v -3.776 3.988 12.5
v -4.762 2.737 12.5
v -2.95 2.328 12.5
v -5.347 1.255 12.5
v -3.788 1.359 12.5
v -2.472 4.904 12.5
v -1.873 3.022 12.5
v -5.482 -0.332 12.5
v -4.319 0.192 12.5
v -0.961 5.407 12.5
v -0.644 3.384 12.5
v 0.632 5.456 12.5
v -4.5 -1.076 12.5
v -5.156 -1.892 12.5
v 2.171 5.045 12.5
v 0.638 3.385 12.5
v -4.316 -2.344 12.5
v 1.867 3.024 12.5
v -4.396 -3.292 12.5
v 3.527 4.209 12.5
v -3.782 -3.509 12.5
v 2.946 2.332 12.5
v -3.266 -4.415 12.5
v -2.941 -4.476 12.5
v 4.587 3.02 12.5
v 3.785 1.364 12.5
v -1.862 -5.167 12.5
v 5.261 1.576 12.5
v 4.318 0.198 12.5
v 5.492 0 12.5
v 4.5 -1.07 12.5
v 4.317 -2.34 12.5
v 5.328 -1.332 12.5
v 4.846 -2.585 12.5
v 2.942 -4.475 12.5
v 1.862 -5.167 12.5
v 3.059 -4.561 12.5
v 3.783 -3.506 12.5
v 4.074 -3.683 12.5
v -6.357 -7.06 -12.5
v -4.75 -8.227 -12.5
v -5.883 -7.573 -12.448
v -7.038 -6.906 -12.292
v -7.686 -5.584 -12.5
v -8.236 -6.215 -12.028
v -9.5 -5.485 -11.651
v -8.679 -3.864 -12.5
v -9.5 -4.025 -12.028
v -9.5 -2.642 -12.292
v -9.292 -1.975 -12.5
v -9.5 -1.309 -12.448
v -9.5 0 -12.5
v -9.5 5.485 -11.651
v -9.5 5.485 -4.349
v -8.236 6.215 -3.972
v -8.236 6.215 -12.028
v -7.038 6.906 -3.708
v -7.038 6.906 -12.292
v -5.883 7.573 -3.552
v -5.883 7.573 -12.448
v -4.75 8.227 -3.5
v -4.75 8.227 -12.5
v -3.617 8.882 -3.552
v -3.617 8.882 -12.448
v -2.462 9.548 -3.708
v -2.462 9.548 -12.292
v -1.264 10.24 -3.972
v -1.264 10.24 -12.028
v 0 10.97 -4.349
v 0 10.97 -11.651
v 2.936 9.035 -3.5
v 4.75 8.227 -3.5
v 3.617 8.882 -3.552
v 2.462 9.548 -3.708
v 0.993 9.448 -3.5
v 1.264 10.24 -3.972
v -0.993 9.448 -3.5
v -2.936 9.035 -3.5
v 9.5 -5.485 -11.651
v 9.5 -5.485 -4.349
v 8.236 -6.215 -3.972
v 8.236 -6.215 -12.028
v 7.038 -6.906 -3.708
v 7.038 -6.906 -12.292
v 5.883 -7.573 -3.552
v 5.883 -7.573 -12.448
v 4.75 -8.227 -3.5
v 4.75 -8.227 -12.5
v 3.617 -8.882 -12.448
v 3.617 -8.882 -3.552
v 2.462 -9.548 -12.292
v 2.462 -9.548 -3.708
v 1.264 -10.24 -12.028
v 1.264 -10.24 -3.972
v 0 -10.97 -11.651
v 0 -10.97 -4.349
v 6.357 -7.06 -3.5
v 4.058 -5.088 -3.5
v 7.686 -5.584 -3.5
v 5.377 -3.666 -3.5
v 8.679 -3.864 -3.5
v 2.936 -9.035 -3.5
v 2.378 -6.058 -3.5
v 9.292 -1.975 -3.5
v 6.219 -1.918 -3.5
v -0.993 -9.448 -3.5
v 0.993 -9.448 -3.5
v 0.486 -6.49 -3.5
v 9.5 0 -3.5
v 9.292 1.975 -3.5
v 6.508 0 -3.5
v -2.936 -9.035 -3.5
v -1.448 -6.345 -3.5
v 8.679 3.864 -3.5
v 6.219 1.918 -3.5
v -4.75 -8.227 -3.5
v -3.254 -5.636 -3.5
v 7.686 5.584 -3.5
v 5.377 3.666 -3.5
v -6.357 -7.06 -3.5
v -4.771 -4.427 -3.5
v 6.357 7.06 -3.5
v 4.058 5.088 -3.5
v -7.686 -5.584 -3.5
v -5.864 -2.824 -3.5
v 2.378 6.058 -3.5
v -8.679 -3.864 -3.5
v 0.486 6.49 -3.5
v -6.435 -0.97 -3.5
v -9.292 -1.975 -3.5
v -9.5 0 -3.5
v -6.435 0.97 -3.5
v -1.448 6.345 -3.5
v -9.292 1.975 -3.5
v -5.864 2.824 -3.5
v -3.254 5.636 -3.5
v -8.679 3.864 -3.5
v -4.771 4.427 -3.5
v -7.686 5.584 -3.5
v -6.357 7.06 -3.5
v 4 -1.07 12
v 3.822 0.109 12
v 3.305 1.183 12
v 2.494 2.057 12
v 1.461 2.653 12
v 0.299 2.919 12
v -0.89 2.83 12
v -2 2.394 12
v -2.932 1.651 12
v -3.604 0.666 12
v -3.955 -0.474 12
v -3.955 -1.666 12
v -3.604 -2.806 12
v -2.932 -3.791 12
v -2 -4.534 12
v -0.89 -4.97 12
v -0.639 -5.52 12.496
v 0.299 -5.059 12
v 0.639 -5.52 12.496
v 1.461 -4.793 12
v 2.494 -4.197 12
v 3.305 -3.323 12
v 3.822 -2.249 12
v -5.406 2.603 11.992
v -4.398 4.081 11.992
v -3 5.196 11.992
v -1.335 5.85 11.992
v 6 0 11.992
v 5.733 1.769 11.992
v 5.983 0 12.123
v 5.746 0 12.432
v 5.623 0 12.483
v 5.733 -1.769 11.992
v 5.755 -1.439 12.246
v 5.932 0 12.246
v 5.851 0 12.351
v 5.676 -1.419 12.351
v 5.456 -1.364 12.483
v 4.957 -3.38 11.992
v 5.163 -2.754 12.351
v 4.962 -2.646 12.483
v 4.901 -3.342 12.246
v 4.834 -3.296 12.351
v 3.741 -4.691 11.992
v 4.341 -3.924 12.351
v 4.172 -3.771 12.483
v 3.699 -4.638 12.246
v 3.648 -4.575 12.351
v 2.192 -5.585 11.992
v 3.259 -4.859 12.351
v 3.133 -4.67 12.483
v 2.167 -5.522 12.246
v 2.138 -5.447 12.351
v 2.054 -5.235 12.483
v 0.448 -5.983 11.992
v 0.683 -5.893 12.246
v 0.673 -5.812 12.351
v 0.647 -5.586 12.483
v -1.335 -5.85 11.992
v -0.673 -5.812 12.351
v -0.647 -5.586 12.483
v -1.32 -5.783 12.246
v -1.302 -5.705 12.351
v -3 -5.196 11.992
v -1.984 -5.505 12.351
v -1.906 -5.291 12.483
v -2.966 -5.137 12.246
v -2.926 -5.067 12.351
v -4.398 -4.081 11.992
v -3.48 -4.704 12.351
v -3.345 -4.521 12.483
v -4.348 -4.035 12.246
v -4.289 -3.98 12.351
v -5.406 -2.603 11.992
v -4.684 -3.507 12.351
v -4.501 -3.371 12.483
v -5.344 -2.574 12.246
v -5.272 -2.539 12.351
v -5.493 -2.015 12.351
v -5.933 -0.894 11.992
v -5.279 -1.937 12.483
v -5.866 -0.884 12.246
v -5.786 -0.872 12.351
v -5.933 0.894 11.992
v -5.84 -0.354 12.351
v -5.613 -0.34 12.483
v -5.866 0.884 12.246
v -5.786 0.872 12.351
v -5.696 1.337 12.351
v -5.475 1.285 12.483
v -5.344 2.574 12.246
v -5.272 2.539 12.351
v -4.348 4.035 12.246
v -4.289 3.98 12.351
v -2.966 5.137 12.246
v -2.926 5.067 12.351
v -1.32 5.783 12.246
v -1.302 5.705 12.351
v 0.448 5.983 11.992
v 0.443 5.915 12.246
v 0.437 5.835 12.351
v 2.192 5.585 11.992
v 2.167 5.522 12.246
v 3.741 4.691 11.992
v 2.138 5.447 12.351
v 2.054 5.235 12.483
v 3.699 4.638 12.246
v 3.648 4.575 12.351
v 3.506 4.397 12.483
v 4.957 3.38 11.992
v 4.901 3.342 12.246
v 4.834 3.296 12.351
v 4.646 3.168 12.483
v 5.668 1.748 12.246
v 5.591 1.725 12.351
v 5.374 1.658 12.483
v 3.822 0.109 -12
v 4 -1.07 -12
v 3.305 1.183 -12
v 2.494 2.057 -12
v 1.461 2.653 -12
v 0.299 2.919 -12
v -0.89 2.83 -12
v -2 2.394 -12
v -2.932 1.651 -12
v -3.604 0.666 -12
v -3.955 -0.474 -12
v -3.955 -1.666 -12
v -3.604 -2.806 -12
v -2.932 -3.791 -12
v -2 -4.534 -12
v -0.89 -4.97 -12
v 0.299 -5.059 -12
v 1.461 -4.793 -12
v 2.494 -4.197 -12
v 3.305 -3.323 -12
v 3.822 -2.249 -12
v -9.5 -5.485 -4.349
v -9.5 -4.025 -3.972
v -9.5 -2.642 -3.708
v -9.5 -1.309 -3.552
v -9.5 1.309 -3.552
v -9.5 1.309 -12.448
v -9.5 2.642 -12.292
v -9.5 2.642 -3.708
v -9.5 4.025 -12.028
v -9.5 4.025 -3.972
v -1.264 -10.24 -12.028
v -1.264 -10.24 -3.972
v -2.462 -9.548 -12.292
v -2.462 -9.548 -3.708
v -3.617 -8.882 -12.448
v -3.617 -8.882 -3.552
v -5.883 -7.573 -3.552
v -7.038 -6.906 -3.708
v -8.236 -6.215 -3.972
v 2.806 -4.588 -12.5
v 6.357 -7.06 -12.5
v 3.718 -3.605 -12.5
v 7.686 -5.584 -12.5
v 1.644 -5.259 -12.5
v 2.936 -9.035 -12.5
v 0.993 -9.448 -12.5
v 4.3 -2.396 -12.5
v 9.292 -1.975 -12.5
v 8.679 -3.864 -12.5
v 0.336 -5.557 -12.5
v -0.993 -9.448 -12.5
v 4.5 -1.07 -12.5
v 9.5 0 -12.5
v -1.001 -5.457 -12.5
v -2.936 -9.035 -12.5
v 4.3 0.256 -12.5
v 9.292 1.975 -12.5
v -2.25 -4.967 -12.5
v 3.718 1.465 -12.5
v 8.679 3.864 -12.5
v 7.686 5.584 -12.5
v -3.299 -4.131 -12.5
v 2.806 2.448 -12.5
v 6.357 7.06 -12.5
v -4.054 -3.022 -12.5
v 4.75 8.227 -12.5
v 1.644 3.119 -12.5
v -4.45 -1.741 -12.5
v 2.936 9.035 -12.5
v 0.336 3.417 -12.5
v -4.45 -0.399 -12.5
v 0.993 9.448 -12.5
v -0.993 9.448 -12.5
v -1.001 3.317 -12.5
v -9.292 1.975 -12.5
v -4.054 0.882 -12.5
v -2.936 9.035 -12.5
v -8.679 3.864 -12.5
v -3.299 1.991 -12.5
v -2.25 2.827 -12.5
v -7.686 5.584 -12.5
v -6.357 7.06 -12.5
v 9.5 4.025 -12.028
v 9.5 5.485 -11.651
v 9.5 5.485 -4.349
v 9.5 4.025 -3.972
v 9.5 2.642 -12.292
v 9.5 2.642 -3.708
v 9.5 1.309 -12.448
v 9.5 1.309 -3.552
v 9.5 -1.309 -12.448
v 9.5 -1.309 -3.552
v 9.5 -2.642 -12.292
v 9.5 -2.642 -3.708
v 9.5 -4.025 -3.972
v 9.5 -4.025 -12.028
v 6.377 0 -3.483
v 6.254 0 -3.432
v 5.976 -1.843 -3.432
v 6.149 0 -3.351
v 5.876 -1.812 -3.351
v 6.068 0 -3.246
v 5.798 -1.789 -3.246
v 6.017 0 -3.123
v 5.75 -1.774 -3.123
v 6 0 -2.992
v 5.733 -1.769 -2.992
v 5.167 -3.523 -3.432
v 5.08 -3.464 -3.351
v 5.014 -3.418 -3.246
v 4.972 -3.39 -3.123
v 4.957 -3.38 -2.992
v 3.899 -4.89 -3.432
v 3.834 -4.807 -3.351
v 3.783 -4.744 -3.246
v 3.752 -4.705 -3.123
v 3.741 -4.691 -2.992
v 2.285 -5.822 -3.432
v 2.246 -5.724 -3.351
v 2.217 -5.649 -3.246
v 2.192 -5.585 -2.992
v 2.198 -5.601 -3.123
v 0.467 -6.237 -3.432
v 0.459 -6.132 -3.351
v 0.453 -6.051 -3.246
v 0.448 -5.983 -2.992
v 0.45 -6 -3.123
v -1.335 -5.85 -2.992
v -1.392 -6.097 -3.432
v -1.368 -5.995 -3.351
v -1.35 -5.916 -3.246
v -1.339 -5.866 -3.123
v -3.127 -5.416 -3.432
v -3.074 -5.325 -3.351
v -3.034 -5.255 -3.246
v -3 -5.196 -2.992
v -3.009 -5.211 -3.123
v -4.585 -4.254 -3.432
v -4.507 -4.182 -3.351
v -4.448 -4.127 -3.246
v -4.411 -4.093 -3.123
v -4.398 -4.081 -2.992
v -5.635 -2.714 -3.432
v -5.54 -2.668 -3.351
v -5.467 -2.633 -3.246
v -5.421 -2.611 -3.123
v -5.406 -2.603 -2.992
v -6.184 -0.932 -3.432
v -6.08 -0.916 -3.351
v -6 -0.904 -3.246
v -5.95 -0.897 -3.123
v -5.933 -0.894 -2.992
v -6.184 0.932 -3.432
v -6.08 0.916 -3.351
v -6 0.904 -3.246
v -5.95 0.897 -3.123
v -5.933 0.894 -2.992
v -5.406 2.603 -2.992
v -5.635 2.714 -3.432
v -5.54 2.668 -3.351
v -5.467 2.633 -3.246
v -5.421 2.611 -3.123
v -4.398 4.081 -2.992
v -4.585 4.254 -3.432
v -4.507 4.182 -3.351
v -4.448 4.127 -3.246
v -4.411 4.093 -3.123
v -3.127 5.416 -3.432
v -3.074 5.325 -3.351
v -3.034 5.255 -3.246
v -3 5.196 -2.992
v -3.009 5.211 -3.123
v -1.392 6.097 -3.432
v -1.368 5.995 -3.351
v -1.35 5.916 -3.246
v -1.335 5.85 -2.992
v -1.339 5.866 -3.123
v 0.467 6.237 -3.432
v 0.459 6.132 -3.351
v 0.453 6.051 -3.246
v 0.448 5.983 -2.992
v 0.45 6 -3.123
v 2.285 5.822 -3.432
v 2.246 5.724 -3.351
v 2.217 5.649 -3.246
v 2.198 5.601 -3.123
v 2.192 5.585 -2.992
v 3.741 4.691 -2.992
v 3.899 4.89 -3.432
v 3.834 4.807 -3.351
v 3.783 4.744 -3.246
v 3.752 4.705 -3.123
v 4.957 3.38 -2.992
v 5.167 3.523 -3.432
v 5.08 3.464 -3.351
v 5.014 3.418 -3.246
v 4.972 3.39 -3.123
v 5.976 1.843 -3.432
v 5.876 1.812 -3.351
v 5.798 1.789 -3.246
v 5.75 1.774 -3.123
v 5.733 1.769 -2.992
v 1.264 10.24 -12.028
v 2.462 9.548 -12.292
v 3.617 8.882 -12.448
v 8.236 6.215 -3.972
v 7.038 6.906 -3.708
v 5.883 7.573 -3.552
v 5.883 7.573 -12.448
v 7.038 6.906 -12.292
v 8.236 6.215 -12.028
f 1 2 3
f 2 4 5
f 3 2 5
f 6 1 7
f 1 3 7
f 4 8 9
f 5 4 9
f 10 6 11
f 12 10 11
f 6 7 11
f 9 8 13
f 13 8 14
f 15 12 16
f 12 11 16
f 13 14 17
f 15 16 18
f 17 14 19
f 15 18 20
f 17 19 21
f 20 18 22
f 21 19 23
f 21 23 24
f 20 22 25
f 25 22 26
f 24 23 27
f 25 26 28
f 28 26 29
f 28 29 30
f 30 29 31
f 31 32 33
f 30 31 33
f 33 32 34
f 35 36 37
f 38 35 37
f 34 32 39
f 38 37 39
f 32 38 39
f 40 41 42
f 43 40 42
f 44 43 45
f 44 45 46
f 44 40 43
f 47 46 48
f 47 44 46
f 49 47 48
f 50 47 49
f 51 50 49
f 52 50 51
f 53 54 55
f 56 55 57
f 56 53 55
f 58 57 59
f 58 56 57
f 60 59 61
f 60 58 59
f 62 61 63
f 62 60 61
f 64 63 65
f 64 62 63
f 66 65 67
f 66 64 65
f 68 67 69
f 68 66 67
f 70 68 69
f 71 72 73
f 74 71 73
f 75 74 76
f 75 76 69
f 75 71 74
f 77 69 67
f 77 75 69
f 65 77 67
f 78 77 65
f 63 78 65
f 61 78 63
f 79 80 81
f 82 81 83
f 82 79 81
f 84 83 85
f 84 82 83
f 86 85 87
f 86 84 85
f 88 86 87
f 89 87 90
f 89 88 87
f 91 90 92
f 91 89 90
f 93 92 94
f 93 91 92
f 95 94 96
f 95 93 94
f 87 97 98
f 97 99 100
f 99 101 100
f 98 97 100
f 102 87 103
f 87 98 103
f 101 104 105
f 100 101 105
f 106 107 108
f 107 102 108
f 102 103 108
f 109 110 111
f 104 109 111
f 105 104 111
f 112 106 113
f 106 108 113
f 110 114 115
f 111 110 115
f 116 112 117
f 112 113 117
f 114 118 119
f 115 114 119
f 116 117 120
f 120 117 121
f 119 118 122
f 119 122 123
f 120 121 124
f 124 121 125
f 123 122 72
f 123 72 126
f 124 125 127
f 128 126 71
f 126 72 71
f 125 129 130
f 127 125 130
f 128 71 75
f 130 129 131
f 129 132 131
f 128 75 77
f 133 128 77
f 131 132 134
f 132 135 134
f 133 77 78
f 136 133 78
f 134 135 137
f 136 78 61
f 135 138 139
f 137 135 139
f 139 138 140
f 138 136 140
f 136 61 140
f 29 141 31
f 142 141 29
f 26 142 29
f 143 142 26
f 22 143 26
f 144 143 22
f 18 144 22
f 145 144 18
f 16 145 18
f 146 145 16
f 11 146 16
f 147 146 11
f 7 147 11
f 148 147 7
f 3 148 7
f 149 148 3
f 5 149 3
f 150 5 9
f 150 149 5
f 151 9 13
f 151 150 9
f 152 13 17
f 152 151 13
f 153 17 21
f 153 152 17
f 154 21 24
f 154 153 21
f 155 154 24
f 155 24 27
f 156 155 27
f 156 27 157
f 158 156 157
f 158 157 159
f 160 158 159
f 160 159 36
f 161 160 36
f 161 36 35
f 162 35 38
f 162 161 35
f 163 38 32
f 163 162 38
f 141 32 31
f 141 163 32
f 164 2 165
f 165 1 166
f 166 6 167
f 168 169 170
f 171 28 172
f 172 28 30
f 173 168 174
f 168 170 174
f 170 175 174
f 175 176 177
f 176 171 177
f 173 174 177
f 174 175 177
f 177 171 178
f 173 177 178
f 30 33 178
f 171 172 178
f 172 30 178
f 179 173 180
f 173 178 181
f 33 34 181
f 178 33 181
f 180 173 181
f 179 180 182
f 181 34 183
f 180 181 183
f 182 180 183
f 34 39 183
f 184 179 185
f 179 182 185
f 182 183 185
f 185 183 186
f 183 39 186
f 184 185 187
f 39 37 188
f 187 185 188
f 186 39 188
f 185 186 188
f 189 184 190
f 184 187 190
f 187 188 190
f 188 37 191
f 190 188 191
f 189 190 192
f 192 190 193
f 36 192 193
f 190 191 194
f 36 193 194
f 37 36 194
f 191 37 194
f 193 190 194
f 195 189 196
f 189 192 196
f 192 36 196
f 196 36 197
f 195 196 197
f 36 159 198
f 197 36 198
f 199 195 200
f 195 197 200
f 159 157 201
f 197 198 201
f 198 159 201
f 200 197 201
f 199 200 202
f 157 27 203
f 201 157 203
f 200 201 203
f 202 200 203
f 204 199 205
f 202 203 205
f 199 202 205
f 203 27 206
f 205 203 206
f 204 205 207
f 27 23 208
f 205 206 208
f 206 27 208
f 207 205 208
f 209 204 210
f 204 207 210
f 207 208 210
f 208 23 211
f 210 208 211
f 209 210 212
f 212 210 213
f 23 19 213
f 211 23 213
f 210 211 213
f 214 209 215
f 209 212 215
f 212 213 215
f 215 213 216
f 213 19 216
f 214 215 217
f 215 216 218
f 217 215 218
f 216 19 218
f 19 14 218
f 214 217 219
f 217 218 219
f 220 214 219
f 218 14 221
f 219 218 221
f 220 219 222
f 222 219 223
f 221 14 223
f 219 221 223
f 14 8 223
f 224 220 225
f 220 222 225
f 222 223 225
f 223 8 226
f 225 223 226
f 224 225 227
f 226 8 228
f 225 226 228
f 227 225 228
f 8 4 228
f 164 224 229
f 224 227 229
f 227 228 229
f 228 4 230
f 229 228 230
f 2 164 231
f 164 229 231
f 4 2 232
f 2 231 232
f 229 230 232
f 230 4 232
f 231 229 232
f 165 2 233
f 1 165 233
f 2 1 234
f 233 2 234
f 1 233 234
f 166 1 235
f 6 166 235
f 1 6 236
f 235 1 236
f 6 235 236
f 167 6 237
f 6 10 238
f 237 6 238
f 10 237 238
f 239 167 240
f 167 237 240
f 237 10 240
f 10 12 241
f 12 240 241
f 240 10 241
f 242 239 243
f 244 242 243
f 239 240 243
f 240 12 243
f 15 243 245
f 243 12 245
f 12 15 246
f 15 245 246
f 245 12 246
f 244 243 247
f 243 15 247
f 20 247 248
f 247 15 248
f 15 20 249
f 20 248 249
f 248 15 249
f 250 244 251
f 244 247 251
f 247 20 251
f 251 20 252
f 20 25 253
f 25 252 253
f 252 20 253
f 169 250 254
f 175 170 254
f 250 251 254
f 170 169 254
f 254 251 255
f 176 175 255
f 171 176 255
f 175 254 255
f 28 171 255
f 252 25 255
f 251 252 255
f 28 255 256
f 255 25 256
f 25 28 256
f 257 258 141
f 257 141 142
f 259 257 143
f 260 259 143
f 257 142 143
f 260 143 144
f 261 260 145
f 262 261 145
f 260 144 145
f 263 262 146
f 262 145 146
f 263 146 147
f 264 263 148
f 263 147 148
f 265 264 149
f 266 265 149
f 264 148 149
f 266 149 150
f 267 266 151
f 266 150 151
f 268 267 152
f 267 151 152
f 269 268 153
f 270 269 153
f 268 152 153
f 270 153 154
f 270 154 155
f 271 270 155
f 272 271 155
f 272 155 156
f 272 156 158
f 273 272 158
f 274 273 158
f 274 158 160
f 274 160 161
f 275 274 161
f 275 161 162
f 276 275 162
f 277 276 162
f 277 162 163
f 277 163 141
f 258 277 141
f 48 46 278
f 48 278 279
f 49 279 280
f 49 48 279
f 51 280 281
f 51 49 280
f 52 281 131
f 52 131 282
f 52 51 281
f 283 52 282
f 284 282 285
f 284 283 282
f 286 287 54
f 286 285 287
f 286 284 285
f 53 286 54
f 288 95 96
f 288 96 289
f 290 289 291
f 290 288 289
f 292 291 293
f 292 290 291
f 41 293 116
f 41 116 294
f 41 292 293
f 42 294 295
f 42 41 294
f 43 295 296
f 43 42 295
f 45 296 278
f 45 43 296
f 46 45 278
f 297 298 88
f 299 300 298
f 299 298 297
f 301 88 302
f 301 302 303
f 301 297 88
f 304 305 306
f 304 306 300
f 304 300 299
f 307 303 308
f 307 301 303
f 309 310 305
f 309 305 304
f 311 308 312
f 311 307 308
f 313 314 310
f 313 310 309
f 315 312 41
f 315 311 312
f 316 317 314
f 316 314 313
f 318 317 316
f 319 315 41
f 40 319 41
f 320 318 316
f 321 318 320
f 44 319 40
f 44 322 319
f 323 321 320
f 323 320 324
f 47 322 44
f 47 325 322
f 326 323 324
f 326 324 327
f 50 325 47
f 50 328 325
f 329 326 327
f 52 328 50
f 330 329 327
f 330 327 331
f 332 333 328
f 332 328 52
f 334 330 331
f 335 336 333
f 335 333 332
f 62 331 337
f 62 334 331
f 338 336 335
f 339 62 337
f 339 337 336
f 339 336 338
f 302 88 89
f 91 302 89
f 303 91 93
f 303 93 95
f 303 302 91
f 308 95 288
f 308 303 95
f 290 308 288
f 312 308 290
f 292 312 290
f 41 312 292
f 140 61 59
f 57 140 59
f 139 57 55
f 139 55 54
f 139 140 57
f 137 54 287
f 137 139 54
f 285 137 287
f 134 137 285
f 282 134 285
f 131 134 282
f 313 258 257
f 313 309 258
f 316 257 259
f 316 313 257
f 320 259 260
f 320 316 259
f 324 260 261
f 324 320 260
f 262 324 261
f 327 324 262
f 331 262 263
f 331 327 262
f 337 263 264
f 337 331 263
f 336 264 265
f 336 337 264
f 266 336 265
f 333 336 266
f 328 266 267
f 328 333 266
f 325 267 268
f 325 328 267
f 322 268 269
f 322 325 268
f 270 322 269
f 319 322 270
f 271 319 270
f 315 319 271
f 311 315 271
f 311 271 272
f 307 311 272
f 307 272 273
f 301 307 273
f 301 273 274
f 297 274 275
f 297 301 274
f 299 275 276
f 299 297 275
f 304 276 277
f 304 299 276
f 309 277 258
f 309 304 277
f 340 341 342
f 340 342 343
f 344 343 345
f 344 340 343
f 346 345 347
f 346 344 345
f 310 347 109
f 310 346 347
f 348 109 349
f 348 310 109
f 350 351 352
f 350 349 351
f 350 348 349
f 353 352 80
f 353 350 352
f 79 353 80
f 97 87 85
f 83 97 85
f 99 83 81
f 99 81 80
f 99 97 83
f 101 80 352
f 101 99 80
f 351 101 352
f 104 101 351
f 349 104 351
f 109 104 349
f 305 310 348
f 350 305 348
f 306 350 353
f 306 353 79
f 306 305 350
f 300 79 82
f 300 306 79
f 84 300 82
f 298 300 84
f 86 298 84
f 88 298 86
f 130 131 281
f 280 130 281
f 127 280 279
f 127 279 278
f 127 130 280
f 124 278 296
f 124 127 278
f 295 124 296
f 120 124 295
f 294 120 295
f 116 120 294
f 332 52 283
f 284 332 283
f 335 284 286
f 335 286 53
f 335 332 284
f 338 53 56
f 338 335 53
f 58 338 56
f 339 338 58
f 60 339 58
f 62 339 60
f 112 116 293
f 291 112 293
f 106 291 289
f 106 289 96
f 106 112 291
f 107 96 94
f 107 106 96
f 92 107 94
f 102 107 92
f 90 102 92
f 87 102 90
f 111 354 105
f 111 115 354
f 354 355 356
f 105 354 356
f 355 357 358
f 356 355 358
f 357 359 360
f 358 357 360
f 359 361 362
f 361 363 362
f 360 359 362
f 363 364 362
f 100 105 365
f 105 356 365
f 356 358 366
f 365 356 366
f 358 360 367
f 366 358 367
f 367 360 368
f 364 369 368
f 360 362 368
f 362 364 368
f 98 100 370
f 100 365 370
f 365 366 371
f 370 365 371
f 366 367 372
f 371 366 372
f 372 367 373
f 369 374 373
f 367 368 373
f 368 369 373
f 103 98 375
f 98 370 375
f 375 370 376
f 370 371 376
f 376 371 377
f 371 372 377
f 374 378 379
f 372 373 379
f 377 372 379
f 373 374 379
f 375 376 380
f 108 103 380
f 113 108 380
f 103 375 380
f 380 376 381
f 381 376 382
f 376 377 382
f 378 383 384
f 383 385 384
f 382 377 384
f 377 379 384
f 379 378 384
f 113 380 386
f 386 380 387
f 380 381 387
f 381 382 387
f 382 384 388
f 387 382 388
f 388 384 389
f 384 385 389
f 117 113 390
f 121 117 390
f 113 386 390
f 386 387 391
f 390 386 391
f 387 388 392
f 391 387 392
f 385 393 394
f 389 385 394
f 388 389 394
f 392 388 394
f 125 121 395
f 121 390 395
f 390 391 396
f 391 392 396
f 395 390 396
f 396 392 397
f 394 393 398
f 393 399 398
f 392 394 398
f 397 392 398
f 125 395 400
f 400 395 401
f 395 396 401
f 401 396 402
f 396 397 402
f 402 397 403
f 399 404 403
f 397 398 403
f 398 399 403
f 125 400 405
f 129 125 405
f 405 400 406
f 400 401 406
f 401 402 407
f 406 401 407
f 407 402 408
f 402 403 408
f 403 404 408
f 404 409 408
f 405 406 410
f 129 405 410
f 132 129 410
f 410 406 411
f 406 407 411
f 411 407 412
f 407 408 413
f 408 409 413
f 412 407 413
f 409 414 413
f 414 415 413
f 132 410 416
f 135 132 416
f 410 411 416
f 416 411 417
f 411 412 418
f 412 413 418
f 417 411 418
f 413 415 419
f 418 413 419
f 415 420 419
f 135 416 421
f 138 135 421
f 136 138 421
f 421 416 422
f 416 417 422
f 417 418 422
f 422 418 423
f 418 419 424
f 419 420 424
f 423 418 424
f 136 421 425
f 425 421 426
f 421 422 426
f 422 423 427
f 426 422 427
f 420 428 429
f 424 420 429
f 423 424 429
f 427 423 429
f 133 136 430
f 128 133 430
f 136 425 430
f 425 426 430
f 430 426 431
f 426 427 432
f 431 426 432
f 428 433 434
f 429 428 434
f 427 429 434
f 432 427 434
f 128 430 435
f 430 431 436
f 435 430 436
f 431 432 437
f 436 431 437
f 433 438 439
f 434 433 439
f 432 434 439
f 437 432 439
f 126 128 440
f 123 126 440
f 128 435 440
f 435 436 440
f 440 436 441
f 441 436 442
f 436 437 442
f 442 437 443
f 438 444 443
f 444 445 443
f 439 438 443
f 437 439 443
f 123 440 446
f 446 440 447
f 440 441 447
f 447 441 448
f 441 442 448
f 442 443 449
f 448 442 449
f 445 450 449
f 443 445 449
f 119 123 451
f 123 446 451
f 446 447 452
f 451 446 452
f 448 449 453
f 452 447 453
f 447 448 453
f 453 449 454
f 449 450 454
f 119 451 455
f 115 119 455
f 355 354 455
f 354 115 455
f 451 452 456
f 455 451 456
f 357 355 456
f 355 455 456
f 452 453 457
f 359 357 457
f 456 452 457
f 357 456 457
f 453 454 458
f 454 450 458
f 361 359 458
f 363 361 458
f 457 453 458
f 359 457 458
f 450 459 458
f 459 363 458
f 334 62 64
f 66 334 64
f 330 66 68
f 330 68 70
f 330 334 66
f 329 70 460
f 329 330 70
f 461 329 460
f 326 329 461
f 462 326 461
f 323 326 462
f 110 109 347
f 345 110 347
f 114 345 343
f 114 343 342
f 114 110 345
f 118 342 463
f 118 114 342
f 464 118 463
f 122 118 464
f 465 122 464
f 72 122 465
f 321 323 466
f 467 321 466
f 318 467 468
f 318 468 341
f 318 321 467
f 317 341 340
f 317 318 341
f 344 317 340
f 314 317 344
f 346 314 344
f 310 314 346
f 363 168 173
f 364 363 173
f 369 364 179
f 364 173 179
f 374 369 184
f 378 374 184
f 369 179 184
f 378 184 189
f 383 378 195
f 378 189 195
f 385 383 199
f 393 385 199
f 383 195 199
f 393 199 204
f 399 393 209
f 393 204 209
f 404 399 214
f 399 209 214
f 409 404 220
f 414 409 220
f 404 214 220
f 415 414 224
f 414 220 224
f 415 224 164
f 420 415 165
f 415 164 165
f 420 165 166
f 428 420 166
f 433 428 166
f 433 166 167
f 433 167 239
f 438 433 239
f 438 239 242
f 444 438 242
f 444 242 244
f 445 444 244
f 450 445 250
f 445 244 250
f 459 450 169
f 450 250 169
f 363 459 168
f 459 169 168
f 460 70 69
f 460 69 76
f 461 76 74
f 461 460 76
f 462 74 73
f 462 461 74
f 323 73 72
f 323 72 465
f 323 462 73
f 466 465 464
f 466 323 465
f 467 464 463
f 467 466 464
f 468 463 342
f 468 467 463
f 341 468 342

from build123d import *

# Parameters (mm, degrees)
HEX_EXTRUDE_DEPTH        = 9
SKETCH4_OUTSIDE_W        = 132.26
SKETCH4_OUTSIDE_H        = 135.2
SKETCH4_OUTSIDE_R        = 9.5
HEX_CUT1_DEPTH           = 29.906458333
HEX_CUT1_DRAFT           = -60
SKETCH5_OUTSIDE_W        = 106.952
SKETCH5_OUTSIDE_H        = 109.892
SKETCH5_OUTSIDE_R        = 9.5
HEX_CUT2_DEPTH           = 22.600540117
HEX_CUT2_DRAFT           = -60
SKETCH6_R                = 4
ECCENTRIC_HOLE_CUT_DEPTH = 29.906458333
FILLET_2_R               = 0.508
CHAMFER_2_SIZE           = 0.5


with BuildPart() as part:
    # Sketch2 → Body Revolve (revolve)
    with BuildSketch(Plane(origin=(0, 0, 0), x_dir=(0, 0, -1), z_dir=(1, 0, 0)), mode=Mode.PRIVATE) as body_revolve_sk:
        Polygon((-12.5, 0), (12.5, 0), (12.5, 9.5), (3.5, 9.5), (3.5, 6), (-12.5, 6), align=None)
    revolve(body_revolve_sk.sketch.rotate(Axis((0, 0, 12.5), (0, 0, -1)), 90), axis=Axis((0, 0, 12.5), (0, 0, -1)))

    # Sketch3 → Hex Extrude (add)
    with BuildSketch(Plane(origin=(0, 0, -12.5), x_dir=(-1, 0, 0), z_dir=(0, 0, -1))):
        Polygon((0, 10.969655115), (-9.5, 5.484827557), (-9.5, -5.484827557), (0, -10.969655115), (9.5, -5.484827557), (9.5, 5.484827557), align=None)
    extrude(amount=-HEX_EXTRUDE_DEPTH)


with BuildPart() as hex_cut1_tool:
    # Sketch4 outside → Hex Cut1 (with draft: the straight prism first)
    with BuildSketch(Plane(origin=(0, 0, -12.5), x_dir=(-1, 0, 0), z_dir=(0, 0, -1))):
        Rectangle(SKETCH4_OUTSIDE_W, SKETCH4_OUTSIDE_H)
        Circle(SKETCH4_OUTSIDE_R, mode=Mode.SUBTRACT)
    extrude(amount=-HEX_CUT1_DEPTH)
    # Hex Cut1: the draft: its side faces are tilted about the plane it starts from
    hex_cut1_sides = [hex_cut1_tool.faces().sort_by_distance(p)[0] for p in [
        (0, -67.6, 2.453229166),
        (-66.13, 0, 2.453229166),
        (0, 67.6, 2.453229166),
        (66.13, 0, 2.453229166),
        (9.5, 0, 2.453229166),
    ]]
    draft(hex_cut1_sides, Plane(origin=(0, 0, -12.5), x_dir=(-1, 0, 0), z_dir=(0, 0, -1)), HEX_CUT1_DRAFT)


with BuildPart() as part_1:
    add(part.part)

    # Hex Cut1: cut by hex_cut1_tool
    add(hex_cut1_tool.part, mode=Mode.SUBTRACT)


with BuildPart() as hex_cut2_tool:
    # Sketch5 outside → Hex Cut2 (with draft: the straight prism first)
    with BuildSketch(Plane.XY.offset(-3.5)):
        Rectangle(SKETCH5_OUTSIDE_W, SKETCH5_OUTSIDE_H)
        Circle(SKETCH5_OUTSIDE_R, mode=Mode.SUBTRACT)
    extrude(amount=-HEX_CUT2_DEPTH)
    # Hex Cut2: the draft: its side faces are tilted about the plane it starts from
    hex_cut2_sides = [hex_cut2_tool.faces().sort_by_distance(p)[0] for p in [
        (0, -54.946, -14.800270058),
        (53.476, 0, -14.800270058),
        (0, 54.946, -14.800270058),
        (-53.476, 0, -14.800270058),
        (-9.5, 0, -14.800270058),
    ]]
    draft(hex_cut2_sides, Plane.XY.offset(-3.5), HEX_CUT2_DRAFT)


with BuildPart() as part_2:
    add(part_1.part)

    # Hex Cut2: cut by hex_cut2_tool
    add(hex_cut2_tool.part, mode=Mode.SUBTRACT)

    # Sketch6 → Eccentric Hole Cut (cut, through all)
    with BuildSketch(Plane.XY.offset(12.5)):
        with Locations((0, -1.07)):
            Circle(SKETCH6_R)
    extrude(amount=-ECCENTRIC_HOLE_CUT_DEPTH, mode=Mode.SUBTRACT)

    # Fillet 2
    fillet_2_edges = [part_2.edges().sort_by_distance(p)[0] for p in [
        (-6, 0, 12.5),
        (-6, 0, -3.5),
    ]]
    fillet(fillet_2_edges, radius=FILLET_2_R)

    # Chamfer 2
    # the kernel refuses this chamfer: 0.5 mm, written as the material it takes off along each edge
    with BuildSketch(Plane(origin=(0, -1.07, -12.5), x_dir=(1, 0, 0), z_dir=(0, -1, 0))) as chamfer_2_piece_1:
        Polygon((4, CHAMFER_2_SIZE), (4 + CHAMFER_2_SIZE, 0), (4, 0), align=None)
    revolve(axis=Axis((0, -1.07, -12.5), (0, 0, 1)), mode=Mode.SUBTRACT)
    with BuildSketch(Plane(origin=(0, -1.07, 12.5), x_dir=(1, 0, 0), z_dir=(0, -1, 0))) as chamfer_2_piece_2:
        Polygon((4 + CHAMFER_2_SIZE, 0), (4, -CHAMFER_2_SIZE), (4, 0), align=None)
    revolve(axis=Axis((0, -1.07, 12.5), (0, 0, 1)), mode=Mode.SUBTRACT)


solid = part_2.part
